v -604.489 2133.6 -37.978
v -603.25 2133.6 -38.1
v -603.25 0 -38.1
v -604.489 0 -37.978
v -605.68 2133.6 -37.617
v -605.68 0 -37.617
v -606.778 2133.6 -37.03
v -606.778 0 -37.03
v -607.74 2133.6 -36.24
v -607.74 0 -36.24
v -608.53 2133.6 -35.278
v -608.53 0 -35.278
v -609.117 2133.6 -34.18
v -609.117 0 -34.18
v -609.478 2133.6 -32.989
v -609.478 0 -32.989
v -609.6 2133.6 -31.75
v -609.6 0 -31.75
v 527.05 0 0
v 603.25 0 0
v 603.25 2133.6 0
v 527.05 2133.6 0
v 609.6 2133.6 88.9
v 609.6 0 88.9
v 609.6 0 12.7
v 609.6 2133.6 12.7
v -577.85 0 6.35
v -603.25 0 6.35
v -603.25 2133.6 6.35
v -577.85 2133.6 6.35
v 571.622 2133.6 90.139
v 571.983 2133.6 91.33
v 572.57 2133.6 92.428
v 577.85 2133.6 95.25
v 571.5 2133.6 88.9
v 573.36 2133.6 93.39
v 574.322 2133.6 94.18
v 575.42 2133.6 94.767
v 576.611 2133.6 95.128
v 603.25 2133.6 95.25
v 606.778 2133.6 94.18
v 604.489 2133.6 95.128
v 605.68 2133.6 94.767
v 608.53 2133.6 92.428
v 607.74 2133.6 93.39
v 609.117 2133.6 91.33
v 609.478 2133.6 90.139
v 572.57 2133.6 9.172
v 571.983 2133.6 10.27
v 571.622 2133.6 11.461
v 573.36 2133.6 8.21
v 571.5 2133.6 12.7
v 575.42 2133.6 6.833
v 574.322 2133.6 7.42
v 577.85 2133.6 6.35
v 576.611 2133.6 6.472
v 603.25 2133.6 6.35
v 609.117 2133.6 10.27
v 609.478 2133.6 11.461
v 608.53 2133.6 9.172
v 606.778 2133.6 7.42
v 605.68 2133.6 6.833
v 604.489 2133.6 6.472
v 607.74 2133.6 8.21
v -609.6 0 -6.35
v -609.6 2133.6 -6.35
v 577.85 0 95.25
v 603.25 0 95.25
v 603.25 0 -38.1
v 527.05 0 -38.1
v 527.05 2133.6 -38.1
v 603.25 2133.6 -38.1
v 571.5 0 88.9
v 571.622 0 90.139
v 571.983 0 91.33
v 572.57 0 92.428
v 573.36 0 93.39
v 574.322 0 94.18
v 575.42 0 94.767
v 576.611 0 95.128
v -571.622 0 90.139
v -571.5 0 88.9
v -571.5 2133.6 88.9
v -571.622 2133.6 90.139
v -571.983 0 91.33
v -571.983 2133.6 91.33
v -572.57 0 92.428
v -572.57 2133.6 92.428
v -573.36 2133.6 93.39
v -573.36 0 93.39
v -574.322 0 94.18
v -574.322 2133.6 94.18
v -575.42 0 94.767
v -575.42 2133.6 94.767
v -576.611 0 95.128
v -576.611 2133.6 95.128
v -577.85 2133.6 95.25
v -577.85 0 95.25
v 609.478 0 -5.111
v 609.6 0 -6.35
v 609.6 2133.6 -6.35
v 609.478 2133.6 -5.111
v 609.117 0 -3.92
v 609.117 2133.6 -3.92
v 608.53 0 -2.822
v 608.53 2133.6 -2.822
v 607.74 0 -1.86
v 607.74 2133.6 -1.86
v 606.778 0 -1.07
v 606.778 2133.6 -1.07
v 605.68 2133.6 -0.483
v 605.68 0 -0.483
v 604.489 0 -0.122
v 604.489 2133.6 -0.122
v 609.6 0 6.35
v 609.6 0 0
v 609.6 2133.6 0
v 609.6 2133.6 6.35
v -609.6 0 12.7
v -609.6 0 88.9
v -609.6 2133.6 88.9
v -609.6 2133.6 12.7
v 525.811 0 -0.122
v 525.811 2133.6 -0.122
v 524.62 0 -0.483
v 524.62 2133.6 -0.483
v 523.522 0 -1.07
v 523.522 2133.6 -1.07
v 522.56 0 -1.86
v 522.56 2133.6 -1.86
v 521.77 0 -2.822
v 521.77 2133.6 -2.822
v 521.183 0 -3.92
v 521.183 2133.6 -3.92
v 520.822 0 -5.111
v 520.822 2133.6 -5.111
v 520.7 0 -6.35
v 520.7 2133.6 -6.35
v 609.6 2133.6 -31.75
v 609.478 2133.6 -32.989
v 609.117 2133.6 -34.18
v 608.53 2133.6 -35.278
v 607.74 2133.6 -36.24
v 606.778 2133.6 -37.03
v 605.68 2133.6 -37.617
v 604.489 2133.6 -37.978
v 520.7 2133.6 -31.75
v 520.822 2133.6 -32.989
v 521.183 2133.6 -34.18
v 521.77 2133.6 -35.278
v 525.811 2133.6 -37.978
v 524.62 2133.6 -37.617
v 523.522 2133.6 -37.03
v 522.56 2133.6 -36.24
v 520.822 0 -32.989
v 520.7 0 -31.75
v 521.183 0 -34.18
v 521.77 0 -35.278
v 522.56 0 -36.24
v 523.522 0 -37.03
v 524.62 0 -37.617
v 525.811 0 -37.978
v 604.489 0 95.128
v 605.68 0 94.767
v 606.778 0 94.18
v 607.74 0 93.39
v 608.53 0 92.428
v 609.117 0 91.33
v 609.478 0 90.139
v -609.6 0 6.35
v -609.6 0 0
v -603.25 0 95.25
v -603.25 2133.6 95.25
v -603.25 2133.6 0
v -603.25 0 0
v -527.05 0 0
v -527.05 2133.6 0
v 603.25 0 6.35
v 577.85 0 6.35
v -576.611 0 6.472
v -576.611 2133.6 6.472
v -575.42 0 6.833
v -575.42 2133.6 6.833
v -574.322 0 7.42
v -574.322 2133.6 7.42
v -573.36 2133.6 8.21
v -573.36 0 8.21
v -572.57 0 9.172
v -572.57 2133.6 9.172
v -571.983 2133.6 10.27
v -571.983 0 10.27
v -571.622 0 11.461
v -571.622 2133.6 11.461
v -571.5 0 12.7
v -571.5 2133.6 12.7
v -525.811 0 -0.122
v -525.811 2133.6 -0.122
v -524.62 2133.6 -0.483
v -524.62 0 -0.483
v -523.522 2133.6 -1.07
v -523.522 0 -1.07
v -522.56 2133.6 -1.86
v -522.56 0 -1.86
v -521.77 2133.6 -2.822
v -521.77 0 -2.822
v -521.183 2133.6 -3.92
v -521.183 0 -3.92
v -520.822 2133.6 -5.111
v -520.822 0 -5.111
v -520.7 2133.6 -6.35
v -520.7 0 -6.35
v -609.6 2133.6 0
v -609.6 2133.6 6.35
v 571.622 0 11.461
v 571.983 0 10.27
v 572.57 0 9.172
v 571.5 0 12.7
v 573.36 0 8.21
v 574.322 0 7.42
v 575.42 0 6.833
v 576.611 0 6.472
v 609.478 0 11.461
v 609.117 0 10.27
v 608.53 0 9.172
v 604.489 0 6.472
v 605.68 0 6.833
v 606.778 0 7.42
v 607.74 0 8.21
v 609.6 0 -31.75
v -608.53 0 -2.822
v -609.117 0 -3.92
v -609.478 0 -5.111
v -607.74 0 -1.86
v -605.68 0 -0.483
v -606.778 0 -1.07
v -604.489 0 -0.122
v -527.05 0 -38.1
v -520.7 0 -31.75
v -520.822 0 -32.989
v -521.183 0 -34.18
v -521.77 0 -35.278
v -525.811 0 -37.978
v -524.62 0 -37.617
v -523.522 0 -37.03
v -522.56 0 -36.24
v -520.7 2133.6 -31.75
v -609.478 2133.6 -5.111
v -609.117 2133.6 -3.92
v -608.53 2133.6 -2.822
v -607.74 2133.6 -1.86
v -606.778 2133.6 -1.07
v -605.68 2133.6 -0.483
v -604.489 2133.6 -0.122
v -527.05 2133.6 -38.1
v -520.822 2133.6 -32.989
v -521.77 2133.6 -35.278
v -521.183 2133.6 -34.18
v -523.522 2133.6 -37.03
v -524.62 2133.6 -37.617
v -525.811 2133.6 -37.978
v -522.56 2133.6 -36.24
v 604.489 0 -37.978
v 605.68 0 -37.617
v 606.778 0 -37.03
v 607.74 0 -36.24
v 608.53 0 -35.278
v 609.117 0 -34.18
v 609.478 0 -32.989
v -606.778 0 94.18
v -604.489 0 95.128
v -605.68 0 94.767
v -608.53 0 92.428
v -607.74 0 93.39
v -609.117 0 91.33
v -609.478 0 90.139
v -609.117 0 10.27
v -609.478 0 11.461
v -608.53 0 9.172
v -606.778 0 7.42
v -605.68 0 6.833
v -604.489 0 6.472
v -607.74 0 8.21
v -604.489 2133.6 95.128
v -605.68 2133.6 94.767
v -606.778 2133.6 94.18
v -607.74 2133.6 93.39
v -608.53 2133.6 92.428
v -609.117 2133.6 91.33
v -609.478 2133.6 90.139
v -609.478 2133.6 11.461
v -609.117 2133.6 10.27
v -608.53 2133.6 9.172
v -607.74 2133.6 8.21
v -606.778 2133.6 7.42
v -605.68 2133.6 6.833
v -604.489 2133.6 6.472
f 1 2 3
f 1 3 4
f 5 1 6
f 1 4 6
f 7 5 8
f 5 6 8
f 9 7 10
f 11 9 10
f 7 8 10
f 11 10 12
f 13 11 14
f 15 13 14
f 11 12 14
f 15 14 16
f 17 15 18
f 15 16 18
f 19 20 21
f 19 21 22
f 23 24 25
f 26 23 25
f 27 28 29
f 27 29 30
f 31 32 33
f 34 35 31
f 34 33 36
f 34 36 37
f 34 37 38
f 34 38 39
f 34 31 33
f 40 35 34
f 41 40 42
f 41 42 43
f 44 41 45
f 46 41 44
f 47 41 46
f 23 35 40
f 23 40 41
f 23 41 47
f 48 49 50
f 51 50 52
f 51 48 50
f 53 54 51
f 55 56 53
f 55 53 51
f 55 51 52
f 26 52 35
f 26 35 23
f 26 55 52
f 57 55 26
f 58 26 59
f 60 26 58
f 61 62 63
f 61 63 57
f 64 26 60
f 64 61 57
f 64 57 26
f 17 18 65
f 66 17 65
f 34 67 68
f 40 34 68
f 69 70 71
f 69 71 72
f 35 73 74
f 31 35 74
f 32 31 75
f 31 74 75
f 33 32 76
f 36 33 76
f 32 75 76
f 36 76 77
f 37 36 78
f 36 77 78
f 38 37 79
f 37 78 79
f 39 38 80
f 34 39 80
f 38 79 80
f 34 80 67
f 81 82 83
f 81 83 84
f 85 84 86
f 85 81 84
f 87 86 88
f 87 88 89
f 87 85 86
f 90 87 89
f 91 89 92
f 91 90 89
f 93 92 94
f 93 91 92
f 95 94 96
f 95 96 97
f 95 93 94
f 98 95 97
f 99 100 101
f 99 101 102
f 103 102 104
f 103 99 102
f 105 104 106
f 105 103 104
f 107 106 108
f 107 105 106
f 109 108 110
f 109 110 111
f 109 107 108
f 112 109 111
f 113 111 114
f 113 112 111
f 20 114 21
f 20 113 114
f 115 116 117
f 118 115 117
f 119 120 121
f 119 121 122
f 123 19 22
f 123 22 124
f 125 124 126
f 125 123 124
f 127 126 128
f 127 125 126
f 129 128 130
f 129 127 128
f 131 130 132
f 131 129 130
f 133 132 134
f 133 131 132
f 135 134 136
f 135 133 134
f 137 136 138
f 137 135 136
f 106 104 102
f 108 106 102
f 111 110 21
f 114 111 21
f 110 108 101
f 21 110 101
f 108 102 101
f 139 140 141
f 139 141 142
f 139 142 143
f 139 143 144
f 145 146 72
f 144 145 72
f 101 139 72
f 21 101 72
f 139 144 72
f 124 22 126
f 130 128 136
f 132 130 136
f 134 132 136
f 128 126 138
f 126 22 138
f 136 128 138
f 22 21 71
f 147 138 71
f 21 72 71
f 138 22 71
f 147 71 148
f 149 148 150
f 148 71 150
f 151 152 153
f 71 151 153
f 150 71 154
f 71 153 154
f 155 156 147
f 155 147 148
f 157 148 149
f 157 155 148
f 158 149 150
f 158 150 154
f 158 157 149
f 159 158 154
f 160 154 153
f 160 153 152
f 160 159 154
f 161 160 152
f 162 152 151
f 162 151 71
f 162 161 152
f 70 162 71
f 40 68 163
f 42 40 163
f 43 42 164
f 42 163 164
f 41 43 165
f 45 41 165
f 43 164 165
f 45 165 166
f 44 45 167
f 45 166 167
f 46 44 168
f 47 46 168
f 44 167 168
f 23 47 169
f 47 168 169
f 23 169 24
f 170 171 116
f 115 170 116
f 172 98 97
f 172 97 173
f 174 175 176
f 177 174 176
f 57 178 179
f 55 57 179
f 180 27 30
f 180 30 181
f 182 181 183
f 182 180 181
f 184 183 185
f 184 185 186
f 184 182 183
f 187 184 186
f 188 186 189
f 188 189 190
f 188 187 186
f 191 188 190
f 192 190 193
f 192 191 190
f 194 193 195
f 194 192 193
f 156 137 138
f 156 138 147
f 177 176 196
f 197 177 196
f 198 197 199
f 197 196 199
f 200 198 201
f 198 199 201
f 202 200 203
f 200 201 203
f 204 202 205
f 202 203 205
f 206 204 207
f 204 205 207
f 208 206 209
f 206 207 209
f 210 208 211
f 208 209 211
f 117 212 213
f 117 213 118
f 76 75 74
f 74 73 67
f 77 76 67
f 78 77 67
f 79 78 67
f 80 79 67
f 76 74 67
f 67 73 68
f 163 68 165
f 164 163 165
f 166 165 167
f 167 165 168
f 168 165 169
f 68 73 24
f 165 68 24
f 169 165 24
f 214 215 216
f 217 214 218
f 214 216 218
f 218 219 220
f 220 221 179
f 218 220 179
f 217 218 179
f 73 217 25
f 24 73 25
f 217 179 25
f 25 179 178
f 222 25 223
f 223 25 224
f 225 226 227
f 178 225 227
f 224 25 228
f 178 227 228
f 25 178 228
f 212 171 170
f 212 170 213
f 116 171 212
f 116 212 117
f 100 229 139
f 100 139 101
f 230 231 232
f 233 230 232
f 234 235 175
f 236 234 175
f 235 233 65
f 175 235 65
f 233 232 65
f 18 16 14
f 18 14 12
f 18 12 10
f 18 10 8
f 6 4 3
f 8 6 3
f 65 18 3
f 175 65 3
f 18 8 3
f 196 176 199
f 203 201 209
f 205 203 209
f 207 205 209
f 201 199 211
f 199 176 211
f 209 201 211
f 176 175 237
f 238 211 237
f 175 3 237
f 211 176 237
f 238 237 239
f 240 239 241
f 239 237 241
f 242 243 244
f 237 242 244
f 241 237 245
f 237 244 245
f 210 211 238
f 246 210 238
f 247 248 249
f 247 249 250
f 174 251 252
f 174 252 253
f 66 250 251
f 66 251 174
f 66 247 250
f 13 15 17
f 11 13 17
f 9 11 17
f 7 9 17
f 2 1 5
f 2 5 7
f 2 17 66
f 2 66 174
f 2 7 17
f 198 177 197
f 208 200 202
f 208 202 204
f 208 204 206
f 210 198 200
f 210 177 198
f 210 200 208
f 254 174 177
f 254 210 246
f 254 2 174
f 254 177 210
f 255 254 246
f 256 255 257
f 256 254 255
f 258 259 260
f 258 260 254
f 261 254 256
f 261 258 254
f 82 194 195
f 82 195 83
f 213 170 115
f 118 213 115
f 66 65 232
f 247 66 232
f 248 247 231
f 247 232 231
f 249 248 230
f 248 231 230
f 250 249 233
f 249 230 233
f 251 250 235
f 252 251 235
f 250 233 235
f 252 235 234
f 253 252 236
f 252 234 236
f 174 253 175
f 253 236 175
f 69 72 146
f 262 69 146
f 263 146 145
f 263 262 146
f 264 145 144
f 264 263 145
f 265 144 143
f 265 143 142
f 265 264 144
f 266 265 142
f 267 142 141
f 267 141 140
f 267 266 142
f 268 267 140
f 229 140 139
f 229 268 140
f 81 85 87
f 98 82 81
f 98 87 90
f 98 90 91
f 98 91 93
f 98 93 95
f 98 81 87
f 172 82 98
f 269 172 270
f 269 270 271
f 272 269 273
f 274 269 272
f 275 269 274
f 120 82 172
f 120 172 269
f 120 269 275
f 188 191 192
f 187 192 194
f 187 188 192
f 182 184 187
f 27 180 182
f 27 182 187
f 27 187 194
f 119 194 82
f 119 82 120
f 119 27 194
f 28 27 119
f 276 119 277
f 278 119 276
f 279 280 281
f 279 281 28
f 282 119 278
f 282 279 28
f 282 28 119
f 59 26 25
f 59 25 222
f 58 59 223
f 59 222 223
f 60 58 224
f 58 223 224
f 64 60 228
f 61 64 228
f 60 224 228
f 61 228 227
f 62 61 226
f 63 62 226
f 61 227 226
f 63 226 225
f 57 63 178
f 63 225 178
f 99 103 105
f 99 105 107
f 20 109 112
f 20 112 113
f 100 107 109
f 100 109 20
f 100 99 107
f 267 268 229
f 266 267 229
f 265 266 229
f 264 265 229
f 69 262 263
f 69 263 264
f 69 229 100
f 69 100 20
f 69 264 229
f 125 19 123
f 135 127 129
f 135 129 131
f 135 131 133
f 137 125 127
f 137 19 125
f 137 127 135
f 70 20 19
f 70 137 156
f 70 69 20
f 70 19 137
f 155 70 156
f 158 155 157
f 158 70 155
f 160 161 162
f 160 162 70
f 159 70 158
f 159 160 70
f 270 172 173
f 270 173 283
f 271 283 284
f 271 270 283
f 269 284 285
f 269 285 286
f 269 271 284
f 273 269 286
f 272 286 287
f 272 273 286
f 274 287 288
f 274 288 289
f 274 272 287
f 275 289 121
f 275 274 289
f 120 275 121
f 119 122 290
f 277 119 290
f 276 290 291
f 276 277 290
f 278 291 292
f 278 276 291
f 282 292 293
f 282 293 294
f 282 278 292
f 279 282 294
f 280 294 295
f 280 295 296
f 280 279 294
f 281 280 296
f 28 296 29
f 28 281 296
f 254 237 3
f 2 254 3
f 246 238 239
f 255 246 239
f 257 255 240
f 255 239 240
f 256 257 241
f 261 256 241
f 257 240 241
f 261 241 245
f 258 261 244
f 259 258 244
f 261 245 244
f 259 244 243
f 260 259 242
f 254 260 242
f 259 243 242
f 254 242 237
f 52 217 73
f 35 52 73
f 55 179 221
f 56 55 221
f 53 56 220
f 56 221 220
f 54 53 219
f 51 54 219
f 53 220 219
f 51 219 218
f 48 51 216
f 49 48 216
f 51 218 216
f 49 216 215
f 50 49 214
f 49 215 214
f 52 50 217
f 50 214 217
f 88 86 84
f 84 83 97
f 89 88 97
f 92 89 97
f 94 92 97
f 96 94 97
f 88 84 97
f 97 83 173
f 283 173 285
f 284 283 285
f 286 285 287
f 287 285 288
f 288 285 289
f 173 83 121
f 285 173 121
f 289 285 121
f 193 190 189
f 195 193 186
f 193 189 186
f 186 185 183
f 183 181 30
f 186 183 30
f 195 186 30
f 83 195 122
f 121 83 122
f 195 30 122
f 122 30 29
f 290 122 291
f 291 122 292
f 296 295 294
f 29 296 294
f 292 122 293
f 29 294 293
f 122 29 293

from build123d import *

# Parameters (mm, degrees)
SKETCH1_W             = 1219.2
SKETCH1_H             = 2133.6
BOSS_EXTRUDE1_DEPTH   = 6.35
BOSS_EXTRUDE2_DEPTH   = 2133.6
BOSS_EXTRUDE2_2_DEPTH = 2133.6
BOSS_EXTRUDE3_DEPTH   = 2133.6
BOSS_EXTRUDE3_2_DEPTH = 2133.6


with BuildPart() as part:
    # Sketch1 → Boss-Extrude1 (new body)
    with BuildSketch(Plane.XY):
        with Locations((0, 1066.8)):
            Rectangle(SKETCH1_W, SKETCH1_H)
    extrude(amount=BOSS_EXTRUDE1_DEPTH)


with BuildPart() as body_2:
    # Sketch2 → Boss-Extrude2 (new body)
    with BuildSketch(Plane(origin=(0, 0, 0), x_dir=(1, 0, 0), z_dir=(0, 1, 0))):
        with BuildLine():
            Line((603.25, -6.35), (577.85, -6.35))
            ThreePointArc((577.85, -6.35), (573.359871939, -8.209871939), (571.5, -12.7))
            Line((571.5, -12.7), (571.5, -88.9))
            ThreePointArc((571.5, -88.9), (573.359871939, -93.390128061), (577.85, -95.25))
            Line((577.85, -95.25), (603.25, -95.25))
            ThreePointArc((603.25, -95.25), (607.740128061, -93.390128061), (609.6, -88.9))
            Line((609.6, -88.9), (609.6, -12.7))
            ThreePointArc((609.6, -12.7), (607.740128061, -8.209871939), (603.25, -6.35))
        make_face()
    extrude(amount=BOSS_EXTRUDE2_DEPTH)


with BuildPart() as body_3:
    # Sketch2 → Boss-Extrude2 2 (new body)
    with BuildSketch(Plane(origin=(0, 0, 0), x_dir=(1, 0, 0), z_dir=(0, 1, 0))):
        with BuildLine():
            Line((-603.25, -6.35), (-577.85, -6.35))
            ThreePointArc((-577.85, -6.35), (-573.359871939, -8.209871939), (-571.5, -12.7))
            Line((-571.5, -12.7), (-571.5, -88.9))
            ThreePointArc((-571.5, -88.9), (-573.359871939, -93.390128061), (-577.85, -95.25))
            Line((-577.85, -95.25), (-603.25, -95.25))
            ThreePointArc((-603.25, -95.25), (-607.740128061, -93.390128061), (-609.6, -88.9))
            Line((-609.6, -88.9), (-609.6, -12.7))
            ThreePointArc((-609.6, -12.7), (-607.740128061, -8.209871939), (-603.25, -6.35))
        make_face()
    extrude(amount=BOSS_EXTRUDE2_2_DEPTH)


with BuildPart() as body_4:
    # Sketch3 → Boss-Extrude3 (new body)
    with BuildSketch(Plane(origin=(0, 0, 0), x_dir=(1, 0, 0), z_dir=(0, 1, 0))):
        with BuildLine():
            Line((603.25, 0), (527.05, 0))
            ThreePointArc((527.05, 0), (522.559871939, 1.859871939), (520.7, 6.35))
            Line((520.7, 6.35), (520.7, 31.75))
            ThreePointArc((520.7, 31.75), (522.559871939, 36.240128061), (527.05, 38.1))
            Line((527.05, 38.1), (603.25, 38.1))
            ThreePointArc((603.25, 38.1), (607.740128061, 36.240128061), (609.6, 31.75))
            Line((609.6, 31.75), (609.6, 6.35))
            ThreePointArc((609.6, 6.35), (607.740128061, 1.859871939), (603.25, 0))
        make_face()
    extrude(amount=BOSS_EXTRUDE3_DEPTH)


with BuildPart() as body_5:
    # Sketch3 → Boss-Extrude3 2 (new body)
    with BuildSketch(Plane(origin=(0, 0, 0), x_dir=(1, 0, 0), z_dir=(0, 1, 0))):
        with BuildLine():
            Line((-603.25, 0), (-527.05, 0))
            ThreePointArc((-527.05, 0), (-522.559871939, 1.859871939), (-520.7, 6.35))
            Line((-520.7, 6.35), (-520.7, 31.75))
            ThreePointArc((-520.7, 31.75), (-522.559871939, 36.240128061), (-527.05, 38.1))
            Line((-527.05, 38.1), (-603.25, 38.1))
            ThreePointArc((-603.25, 38.1), (-607.740128061, 36.240128061), (-609.6, 31.75))
            Line((-609.6, 31.75), (-609.6, 6.35))
            ThreePointArc((-609.6, 6.35), (-607.740128061, 1.859871939), (-603.25, 0))
        make_face()
    extrude(amount=BOSS_EXTRUDE3_2_DEPTH)


solid = Compound([part.part, body_2.part, body_3.part, body_4.part, body_5.part])
